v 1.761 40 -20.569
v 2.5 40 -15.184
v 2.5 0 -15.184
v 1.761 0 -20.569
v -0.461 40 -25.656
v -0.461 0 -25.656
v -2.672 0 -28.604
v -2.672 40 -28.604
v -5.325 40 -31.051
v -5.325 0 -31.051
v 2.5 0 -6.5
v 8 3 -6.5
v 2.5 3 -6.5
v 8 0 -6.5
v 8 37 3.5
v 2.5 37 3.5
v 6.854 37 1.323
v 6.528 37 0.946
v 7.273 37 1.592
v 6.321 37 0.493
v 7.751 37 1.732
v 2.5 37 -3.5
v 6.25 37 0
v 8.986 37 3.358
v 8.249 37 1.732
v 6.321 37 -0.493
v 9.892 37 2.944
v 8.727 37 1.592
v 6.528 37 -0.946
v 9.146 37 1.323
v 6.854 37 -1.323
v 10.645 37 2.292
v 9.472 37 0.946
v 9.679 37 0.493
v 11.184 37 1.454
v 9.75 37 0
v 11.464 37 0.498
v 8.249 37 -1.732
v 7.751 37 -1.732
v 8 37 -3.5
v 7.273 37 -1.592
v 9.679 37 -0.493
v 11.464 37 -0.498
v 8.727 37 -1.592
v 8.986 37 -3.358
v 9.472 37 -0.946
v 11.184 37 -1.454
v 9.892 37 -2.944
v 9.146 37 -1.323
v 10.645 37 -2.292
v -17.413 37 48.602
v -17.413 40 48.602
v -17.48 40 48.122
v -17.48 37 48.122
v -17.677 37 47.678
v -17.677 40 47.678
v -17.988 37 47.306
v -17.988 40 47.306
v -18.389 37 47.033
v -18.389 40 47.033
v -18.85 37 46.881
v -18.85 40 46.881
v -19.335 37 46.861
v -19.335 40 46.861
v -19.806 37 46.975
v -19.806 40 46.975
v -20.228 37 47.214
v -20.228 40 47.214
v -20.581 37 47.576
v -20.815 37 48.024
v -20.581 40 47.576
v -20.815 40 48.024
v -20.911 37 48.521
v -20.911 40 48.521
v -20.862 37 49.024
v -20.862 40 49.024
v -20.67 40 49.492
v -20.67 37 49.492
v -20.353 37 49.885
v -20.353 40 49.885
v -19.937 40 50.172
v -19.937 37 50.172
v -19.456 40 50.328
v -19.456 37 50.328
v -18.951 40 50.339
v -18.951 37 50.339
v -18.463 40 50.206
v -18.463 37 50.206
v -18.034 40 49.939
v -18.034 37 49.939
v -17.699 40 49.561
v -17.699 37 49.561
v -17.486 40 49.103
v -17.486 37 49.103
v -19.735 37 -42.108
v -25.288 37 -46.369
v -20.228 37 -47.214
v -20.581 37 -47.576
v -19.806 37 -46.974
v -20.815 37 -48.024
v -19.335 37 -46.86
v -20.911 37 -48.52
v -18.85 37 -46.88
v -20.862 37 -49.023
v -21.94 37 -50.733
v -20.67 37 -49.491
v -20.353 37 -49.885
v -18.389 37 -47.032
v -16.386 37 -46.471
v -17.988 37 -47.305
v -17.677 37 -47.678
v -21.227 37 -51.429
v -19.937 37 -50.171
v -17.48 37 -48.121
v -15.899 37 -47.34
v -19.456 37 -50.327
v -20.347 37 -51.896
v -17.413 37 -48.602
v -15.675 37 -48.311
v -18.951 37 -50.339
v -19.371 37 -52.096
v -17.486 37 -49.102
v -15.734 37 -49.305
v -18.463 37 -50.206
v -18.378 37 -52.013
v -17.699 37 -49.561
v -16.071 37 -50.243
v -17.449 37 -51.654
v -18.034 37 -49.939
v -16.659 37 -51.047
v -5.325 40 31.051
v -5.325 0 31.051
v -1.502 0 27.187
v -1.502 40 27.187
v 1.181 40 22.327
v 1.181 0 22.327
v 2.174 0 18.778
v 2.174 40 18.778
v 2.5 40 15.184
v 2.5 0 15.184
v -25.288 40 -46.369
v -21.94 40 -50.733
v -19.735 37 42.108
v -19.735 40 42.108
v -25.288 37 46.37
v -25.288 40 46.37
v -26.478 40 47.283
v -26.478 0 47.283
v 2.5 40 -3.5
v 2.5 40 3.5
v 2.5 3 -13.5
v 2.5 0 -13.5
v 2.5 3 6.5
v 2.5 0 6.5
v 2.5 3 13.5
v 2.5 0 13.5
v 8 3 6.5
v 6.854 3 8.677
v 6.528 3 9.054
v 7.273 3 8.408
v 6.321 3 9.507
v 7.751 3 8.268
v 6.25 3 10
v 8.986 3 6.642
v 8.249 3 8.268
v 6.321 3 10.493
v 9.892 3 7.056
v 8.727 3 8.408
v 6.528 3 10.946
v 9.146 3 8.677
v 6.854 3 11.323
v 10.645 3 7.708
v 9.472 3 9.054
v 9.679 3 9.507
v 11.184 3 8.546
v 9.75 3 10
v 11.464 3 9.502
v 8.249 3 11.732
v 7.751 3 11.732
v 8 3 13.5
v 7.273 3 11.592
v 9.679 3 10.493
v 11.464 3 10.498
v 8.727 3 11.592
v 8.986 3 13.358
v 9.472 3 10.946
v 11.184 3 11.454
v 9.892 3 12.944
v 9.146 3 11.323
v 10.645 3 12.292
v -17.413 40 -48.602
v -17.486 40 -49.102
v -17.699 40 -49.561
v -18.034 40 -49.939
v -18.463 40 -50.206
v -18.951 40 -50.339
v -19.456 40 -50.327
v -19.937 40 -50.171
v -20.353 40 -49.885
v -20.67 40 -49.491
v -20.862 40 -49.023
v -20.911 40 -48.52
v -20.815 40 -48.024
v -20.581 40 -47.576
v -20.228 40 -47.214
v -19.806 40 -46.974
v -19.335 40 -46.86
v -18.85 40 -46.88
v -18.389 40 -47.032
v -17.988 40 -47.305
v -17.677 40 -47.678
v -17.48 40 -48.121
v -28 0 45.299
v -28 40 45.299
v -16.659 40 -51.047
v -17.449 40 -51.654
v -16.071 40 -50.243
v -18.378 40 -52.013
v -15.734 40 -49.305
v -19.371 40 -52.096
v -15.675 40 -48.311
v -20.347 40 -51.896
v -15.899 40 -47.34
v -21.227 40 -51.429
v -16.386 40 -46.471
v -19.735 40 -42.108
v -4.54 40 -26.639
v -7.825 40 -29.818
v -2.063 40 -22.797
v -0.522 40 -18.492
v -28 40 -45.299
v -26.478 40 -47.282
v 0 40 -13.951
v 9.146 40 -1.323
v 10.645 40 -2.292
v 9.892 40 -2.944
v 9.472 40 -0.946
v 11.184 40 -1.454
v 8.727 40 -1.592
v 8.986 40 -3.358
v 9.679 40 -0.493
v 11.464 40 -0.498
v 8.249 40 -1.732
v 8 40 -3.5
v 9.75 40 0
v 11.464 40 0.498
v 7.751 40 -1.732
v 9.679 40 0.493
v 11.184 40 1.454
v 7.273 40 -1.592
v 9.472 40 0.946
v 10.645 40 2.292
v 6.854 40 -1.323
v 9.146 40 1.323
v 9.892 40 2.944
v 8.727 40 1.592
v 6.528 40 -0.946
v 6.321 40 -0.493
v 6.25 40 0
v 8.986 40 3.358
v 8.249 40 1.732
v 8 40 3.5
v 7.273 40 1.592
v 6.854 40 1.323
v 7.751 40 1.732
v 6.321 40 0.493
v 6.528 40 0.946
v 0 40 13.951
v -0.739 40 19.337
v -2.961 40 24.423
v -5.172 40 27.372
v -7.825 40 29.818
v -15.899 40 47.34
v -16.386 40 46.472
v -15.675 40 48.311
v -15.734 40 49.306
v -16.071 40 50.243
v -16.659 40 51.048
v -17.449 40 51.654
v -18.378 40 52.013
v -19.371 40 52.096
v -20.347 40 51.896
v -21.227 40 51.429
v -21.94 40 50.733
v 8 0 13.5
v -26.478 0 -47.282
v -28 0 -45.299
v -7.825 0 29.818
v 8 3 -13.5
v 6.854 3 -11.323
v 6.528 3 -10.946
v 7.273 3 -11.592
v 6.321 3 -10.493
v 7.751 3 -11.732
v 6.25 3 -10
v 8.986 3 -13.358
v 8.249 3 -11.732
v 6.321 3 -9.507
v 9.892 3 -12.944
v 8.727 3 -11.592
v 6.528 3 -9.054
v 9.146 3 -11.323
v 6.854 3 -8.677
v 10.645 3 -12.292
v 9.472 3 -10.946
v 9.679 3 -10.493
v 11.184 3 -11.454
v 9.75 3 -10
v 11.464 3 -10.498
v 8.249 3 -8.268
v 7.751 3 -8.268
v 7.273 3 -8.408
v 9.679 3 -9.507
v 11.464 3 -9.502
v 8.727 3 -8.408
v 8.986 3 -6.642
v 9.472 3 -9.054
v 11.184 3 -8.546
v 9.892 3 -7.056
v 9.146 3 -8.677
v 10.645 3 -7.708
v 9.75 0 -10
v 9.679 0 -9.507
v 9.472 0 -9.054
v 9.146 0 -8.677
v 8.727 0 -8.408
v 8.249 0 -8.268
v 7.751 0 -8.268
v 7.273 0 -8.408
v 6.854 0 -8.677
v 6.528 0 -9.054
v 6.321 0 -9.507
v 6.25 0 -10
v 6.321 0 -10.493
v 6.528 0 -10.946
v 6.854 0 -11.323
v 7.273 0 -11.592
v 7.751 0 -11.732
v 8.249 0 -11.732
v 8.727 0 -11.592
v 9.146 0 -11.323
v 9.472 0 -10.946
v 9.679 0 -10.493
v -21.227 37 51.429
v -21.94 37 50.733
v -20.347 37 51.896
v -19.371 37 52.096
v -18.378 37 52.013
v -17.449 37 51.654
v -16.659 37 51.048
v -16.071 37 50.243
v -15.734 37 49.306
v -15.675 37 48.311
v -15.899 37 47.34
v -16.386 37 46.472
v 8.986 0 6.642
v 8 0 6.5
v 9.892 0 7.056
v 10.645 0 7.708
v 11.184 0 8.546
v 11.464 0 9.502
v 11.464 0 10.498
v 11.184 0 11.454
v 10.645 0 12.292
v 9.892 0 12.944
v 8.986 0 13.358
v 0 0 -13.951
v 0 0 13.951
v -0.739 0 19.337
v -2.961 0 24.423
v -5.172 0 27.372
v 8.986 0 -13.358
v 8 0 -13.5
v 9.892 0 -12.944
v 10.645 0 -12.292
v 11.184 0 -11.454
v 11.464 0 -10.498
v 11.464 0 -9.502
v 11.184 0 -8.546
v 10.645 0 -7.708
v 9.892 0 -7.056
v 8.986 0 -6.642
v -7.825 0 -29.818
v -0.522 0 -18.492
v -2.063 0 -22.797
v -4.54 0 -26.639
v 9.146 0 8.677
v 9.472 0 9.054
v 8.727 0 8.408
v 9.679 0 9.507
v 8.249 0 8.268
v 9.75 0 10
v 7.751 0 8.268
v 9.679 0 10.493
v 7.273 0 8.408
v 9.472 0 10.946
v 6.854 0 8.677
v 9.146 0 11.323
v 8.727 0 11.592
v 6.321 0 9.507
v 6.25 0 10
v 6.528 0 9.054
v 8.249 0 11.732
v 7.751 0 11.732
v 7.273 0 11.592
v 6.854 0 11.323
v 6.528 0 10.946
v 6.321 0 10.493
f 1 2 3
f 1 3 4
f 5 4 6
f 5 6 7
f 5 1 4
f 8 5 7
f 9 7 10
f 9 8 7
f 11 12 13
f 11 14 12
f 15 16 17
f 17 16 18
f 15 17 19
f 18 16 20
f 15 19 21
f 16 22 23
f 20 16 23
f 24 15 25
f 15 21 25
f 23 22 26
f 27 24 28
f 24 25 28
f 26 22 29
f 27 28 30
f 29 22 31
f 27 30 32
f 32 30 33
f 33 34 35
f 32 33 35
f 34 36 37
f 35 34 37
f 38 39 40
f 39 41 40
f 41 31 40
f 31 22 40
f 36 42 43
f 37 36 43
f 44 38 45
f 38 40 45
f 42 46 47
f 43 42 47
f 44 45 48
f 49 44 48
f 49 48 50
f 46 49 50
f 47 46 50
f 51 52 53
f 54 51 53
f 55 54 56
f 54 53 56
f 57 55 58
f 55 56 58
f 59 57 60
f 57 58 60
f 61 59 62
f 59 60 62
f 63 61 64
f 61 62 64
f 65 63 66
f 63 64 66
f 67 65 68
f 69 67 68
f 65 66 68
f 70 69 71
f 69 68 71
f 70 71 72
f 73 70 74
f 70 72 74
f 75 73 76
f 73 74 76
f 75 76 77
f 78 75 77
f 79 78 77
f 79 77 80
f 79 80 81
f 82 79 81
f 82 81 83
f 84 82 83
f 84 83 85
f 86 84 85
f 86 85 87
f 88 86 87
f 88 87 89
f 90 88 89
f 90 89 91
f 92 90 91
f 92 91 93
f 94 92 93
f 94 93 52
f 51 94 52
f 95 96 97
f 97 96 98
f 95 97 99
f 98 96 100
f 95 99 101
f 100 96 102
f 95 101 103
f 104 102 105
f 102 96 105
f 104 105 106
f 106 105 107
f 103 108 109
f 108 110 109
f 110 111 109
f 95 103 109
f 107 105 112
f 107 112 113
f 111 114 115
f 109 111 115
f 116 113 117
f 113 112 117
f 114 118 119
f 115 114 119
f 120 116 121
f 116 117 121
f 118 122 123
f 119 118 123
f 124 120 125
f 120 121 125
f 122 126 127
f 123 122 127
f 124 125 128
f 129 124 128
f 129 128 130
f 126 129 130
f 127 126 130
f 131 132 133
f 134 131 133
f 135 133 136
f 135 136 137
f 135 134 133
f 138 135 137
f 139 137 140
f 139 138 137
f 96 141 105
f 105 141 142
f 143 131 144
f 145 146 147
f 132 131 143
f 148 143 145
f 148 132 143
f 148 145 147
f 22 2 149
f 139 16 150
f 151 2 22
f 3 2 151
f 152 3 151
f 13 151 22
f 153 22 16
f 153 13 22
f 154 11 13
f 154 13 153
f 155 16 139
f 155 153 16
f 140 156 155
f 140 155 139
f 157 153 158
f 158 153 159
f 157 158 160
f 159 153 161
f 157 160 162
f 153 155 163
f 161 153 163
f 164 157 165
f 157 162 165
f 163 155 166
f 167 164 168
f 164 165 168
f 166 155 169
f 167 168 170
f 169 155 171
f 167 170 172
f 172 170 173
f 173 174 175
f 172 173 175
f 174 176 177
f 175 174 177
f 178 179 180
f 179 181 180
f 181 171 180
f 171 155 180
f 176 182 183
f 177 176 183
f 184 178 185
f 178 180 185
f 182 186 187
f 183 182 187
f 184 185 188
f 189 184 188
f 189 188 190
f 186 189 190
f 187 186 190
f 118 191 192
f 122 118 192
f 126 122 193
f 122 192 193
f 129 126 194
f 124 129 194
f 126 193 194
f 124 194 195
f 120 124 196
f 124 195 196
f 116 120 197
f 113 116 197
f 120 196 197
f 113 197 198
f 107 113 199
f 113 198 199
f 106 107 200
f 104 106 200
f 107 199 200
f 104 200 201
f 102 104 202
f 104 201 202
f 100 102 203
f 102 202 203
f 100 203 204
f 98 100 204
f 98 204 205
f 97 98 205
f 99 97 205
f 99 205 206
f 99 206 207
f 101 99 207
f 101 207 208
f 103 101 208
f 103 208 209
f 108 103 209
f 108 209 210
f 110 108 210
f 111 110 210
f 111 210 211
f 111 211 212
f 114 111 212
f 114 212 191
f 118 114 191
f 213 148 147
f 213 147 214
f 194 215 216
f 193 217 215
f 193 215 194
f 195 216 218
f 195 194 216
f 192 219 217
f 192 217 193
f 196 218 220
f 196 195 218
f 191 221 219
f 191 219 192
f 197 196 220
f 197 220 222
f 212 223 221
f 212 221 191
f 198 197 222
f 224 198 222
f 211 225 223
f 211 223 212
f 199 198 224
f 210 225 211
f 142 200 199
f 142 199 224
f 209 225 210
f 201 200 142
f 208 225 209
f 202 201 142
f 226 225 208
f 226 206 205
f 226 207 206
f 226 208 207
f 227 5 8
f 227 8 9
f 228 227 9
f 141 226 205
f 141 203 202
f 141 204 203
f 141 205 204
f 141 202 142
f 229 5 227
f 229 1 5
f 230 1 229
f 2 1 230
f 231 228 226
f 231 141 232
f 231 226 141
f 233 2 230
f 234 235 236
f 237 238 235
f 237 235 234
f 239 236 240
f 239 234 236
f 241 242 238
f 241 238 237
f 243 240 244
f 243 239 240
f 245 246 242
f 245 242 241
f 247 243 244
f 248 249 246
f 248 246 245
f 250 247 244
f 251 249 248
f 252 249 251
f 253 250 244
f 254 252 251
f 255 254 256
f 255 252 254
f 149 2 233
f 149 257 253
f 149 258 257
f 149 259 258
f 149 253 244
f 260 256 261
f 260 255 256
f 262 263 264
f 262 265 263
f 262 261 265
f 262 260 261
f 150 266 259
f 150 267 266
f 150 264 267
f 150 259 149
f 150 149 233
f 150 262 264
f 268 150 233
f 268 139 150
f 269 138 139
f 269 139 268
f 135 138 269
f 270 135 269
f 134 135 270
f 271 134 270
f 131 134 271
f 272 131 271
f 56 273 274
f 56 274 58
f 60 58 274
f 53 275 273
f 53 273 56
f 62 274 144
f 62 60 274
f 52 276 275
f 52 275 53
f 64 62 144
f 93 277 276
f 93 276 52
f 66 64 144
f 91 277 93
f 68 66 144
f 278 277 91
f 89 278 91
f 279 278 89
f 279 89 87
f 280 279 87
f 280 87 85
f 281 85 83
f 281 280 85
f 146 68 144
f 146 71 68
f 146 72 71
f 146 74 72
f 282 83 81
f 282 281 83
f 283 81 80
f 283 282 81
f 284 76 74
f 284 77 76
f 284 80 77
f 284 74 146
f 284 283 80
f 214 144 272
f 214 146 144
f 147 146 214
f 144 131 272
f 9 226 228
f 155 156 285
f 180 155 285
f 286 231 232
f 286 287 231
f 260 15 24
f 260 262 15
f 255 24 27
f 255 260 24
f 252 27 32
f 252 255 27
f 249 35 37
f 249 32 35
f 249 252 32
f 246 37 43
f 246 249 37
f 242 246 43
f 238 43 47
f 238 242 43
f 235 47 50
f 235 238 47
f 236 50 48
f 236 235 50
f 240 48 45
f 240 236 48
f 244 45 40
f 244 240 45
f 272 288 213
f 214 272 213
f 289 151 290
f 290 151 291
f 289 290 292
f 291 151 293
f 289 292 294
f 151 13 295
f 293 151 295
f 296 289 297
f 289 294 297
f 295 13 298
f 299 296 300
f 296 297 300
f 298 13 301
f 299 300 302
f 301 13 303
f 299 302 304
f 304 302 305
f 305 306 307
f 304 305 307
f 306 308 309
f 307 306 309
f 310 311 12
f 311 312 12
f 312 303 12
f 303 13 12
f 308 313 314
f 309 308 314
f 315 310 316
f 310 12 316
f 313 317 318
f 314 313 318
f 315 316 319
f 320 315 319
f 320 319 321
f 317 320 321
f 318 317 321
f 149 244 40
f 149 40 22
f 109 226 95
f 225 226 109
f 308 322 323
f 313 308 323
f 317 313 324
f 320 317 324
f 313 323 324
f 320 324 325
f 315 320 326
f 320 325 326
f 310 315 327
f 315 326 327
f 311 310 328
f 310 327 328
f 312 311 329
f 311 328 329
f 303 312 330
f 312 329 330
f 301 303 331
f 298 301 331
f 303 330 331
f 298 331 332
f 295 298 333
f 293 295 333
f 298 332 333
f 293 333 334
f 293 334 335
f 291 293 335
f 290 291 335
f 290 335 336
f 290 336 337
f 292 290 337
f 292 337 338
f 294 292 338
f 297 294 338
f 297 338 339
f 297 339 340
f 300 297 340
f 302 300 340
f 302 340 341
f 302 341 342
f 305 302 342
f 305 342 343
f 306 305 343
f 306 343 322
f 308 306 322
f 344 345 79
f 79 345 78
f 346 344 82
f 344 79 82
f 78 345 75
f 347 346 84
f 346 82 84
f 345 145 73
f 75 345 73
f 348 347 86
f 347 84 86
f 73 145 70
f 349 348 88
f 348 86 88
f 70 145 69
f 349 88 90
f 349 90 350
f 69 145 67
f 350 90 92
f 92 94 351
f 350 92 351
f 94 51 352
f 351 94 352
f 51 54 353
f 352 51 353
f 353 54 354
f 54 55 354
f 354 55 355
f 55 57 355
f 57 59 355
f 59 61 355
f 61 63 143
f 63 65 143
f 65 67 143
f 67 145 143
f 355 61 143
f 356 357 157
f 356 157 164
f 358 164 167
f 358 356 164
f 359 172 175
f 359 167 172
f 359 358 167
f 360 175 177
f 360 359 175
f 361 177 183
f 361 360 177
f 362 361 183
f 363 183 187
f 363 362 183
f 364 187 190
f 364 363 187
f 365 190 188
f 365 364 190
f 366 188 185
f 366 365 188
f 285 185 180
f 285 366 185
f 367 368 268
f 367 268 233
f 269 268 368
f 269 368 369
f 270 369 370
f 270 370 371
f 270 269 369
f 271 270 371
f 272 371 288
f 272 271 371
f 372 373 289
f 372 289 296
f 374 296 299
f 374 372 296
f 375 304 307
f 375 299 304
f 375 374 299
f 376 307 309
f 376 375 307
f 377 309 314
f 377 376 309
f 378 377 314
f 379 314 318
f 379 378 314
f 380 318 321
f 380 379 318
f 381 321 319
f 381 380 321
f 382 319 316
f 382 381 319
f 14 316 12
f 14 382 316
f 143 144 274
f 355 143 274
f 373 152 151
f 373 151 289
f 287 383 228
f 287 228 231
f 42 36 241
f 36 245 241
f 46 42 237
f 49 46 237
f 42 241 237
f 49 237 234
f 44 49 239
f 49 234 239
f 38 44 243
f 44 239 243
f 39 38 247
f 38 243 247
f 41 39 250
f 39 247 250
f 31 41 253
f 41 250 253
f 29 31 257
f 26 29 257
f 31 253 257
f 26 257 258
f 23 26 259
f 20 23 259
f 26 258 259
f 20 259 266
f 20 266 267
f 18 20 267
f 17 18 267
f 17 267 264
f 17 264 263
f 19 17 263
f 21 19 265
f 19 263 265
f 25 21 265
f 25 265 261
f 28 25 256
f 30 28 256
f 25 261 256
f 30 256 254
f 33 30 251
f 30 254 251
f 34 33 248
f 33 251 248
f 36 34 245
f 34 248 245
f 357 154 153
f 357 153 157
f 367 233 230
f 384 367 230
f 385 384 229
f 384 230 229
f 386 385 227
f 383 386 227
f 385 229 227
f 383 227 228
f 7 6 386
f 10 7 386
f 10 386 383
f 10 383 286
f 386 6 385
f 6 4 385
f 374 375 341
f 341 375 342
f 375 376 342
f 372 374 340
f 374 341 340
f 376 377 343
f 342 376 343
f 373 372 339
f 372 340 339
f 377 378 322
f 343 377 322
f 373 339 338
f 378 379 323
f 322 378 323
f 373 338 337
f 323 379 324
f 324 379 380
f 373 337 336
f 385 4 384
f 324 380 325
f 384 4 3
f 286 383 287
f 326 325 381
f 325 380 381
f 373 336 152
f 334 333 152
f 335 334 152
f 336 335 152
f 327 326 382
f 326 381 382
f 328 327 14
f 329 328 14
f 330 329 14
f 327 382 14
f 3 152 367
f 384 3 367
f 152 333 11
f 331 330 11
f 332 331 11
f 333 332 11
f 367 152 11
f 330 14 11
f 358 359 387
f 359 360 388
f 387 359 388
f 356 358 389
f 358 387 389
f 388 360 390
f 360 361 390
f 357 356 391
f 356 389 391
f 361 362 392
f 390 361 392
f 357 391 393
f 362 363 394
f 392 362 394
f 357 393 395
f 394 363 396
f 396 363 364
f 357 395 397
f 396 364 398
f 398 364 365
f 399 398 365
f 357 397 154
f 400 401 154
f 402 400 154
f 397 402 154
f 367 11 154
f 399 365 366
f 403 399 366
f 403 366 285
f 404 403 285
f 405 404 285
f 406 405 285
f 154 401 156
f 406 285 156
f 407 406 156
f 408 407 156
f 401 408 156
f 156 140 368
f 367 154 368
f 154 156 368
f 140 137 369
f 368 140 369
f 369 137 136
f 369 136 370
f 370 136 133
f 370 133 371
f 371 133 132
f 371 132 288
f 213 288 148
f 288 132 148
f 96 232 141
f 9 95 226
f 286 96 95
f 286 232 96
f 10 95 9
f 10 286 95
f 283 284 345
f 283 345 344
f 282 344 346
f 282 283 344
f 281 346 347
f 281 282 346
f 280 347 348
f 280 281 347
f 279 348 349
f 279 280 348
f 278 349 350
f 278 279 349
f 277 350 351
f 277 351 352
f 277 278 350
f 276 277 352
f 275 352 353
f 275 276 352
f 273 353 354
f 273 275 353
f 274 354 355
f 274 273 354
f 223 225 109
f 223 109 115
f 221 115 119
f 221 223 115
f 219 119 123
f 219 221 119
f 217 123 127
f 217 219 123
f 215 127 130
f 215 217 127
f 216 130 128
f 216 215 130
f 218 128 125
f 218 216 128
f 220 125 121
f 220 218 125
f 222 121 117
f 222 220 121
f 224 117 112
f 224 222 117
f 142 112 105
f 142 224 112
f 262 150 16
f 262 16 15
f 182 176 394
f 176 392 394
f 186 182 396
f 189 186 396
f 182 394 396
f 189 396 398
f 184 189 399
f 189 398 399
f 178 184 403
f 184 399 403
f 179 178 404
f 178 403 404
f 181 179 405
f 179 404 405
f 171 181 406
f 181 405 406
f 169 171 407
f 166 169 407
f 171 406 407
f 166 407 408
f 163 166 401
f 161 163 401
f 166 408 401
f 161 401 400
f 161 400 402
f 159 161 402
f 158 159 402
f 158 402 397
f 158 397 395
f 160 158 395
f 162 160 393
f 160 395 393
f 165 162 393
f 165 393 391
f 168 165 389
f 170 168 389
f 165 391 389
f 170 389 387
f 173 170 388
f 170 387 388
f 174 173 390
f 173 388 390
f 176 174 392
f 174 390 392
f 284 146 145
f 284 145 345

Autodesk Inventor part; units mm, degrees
ref_plane "YZ Plane" through (0, 0, 0) normal (1, 0, 0) x (0, 1, 0)
ref_plane "XZ Plane" through (0, 0, 0) normal (0, 1, 0) x (-1, 0, 0)
ref_plane "XY Plane" through (0, 0, 0) normal (0, 0, 1) x (1, 0, 0)
sketch "Sketch1" plane through (0, 0, 0) normal (0, 1, 0) x (-1, 0, 0)
  line L0 (0, 0) -> (0, 23.8143)
  line L1 (0, 23.8143) -> (7.4151, 29.5041)
  line L2 (0, 23.8143) -> (9.3465, 23.8143) construction
  line L3 (0, 23.8143) -> (28, 45.2994)
  line L4 (0, 23.8143) -> (0, -23.8137)
  line L5 (0, -23.8137) -> (28, -45.2989)
  line L6 (28, -45.2989) -> (26.4781, -47.2823)
  line L7 (26.4781, -47.2823) -> (-0.4066, -26.6529)
  line L8 (0, -16.592) -> (-2.5, -16.592)
  line L9 (-2.5, -16.592) -> (-2.5, -25.0466)
  line L10 (-2.5, -25.0466) -> (-0.4066, -26.6529)
  line L11 (-2.5, -16.592) -> (-2.5, 22.9887)
  line L12 (0.8654, 24.4783) -> (-0.6565, 26.4617)
  line L13 (-0.6565, 26.4617) -> (-2.5, 25.0471)
  line L14 (-2.5, 25.0471) -> (-2.5, 22.9887)
  line L15 (-0.6565, 26.4617) -> (26.4781, 47.2828)
  line L16 (26.4781, 47.2828) -> (28, 45.2994)
  line L17 (26.4781, 47.2828) -> (28, 45.2994)
  line L18 (28, 45.2994) -> (0.8654, 24.4783)
  dimension "d0" = 23.8143
  dimension "d1" = 37.5
  dimension "d2" = 35.2932
  dimension "d3" = 47.628
  dimension "d4" = 35.2932
  dimension "d5" = 2.5
  dimension "d6" = 2.5
  dimension "d7" = 2.5
extrude "Extrusion1" add sketch "Sketch1" along normal blind 40
sketch "Sketch2" plane through (0, 40, 0) normal (0, 1, 0) x (1, 0, 0)
  line L0 (0, 0) -> (8, 0)
  line L1 (-28, 45.2989) -> (0, 23.8137) projected
  line L2 (-28, 45.2989) -> (-24.0332, 42.2551)
  line L3 (-24.0332, 42.2551) -> (-19.1631, 48.6019)
  line L4 (0, -23.8143) -> (-28, -45.2994) projected
  line L5 (-28, -45.2994) -> (-24.0332, -42.2556)
  line L6 (-24.0332, -42.2556) -> (-19.1631, -48.6024)
  circle A0 centre (-19.1631, -48.6024) radius 1.75
  circle A1 centre (-19.1631, -48.6024) radius 3.5
  circle A2 centre (8, 0) radius 1.75
  circle A3 centre (8, 0) radius 3.5
  circle A4 centre (-19.1631, 48.6019) radius 1.75
  circle A5 centre (-19.1631, 48.6019) radius 3.5
  line L7 (2.5, 25.0466) -> (-26.4781, 47.2823) projected
  line L8 (-22.5113, 44.2385) -> (-25.2881, 46.3691)
  line L9 (-25.2881, 46.3691) -> (-21.9399, 50.7326)
  line L10 (-22.5113, 44.2385) -> (-19.7346, 42.1078)
  line L11 (-19.7346, 42.1078) -> (-16.3864, 46.4712)
  line L12 (8, 3.5) -> (2.5, 3.5)
  line L13 (2.5, 3.5) -> (2.5, -3.5)
  line L14 (2.5, -25.0471) -> (2.5, 25.0466) projected
  line L15 (2.5, -3.5) -> (8, -3.5)
  line L16 (-26.4781, -47.2828) -> (2.5, -25.0471) projected
  line L17 (-22.5113, -44.239) -> (-19.7346, -42.1083)
  line L18 (-19.7346, -42.1083) -> (-16.3864, -46.4718)
  line L19 (-22.5113, -44.239) -> (-25.2881, -46.3697)
  line L20 (-25.2881, -46.3697) -> (-21.9399, -50.7331)
  dimension "d10" = 8
  dimension "d11" = 5
  dimension "d12" = 8
  dimension "d13" = 8
  dimension "d14" = 3.5
  dimension "d15" = 7
  dimension "d16" = 3.5
  dimension "d17" = 7
  dimension "d18" = 3.5
  dimension "d19" = 7
  dimension "d20" = 3.5
  dimension "d21" = 3.5
extrude "Extrusion2" add sketch "Sketch2" against normal blind 3
sketch "Sketch3" plane through (0, 0, 0) normal (0, -1, 0) x (1, 0, 0)
  line L0 (0, 0) -> (0, 10)
  line L1 (0, -23.8137) -> (0, 23.8143) projected
  line L2 (0, 10) -> (0, -10)
  line L3 (0, -10) -> (8, -10)
  line L4 (0, 10) -> (8, 10)
  circle A0 centre (8, 10) radius 1.75
  circle A1 centre (8, -10) radius 1.75
  circle A2 centre (8, -10) radius 3.5
  circle A3 centre (8, 10) radius 3.5
  line L5 (2.5, 25.0471) -> (2.5, -25.0466) projected
  line L6 (2.5, 10) -> (2.5, 6.5)
  line L7 (2.5, 6.5) -> (8, 6.5)
  line L8 (2.5, 10) -> (2.5, 13.5)
  line L9 (2.5, 13.5) -> (8, 13.5)
  line L10 (2.5, -10) -> (2.5, -13.5)
  line L11 (2.5, -13.5) -> (8, -13.5)
  line L12 (2.5, -10) -> (2.5, -6.5)
  line L13 (2.5, -6.5) -> (8, -6.5)
  dimension "d24" = 10
  dimension "d25" = 20
  dimension "d26" = 8
  dimension "d27" = 3.5
  dimension "d28" = 7
extrude "Extrusion3" add sketch "Sketch3" against normal blind 3 contours L5 L9 A3 L4 | L4 A3 L7 L5 | L5 L13 A2 L3 | L3 A2 L11 L5 | A3 | A2
sketch "Sketch4" plane through (0, 0, 0) normal (0, -1, 0) x (1, 0, 0)
  line L0 (2.5, 13.5) -> (8, 13.5) projected
  line L1 (2.5, 13.5) -> (12.0473, 13.5)
  line L2 (12.0473, 13.5) -> (12.0473, 6.5)
  line L3 (12.0473, 6.5) -> (2.5, 6.5)
  line L4 (2.5, 6.5) -> (2.5, 13.5)
  line L5 (2.5, -6.5) -> (8, -6.5) projected
  line L6 (2.5, -6.5) -> (13.899, -6.5)
  line L7 (13.899, -6.5) -> (13.899, -13.5)
  line L8 (13.899, -13.5) -> (2.5, -13.5)
  line L9 (2.5, -13.5) -> (2.5, -6.5)
  point P0 (0, 0)
  dimension "d31" = 7
extrude "Extrusion4" cut sketch "Sketch4" against normal blind 3
sketch "Sketch5" plane through (0, 0, 0) normal (0, -1, 0) x (1, 0, 0)
  point P0 (0, 0)
fillet "Fillet1" radius 20 4 edges at (0, 20, -23.8137) (0, 20, 23.8143) (2.5, 20, 25.0471) (2.5, 20, -25.0466)
sketch "Sketch6" plane through (0, 0, 0) normal (0, -1, 0) x (1, 0, 0)
  line L0 (0, 0) -> (0, 10)
  line L1 (0, -13.9508) -> (0, 13.9514) projected
  line L2 (0, 10) -> (8, 10)
  circle A0 centre (8, 10) radius 1.75
  circle A1 centre (8, 10) radius 3.5
  line L3 (2.5, 15.1842) -> (2.5, 3.5) projected
  line L4 (2.5, 10) -> (2.5, 13.5)
  line L5 (2.5, 13.5) -> (8, 13.5)
  line L6 (2.5, 10) -> (2.5, 6.5)
  line L7 (2.5, 6.5) -> (8, 6.5)
  line L8 (0, 0) -> (0, -10)
  line L9 (0, -10) -> (8, -10)
  circle A2 centre (8, -10) radius 1.75
  circle A3 centre (8, -10) radius 3.5
  line L10 (8, -6.5) -> (2.5, -6.5)
  line L11 (2.5, 15.1842) -> (2.5, -15.1837) projected
  line L12 (2.5, -6.5) -> (2.5, -13.5)
  line L13 (2.5, -13.5) -> (8, -13.5)
  dimension "d35" = 10
  dimension "d36" = 8
  dimension "d37" = 3.5
  dimension "d38" = 7
  dimension "d39" = 10
  dimension "d40" = 8
extrude "Extrusion5" add sketch "Sketch6" against normal blind 3 contours L3 L5 A1 L2 | L2 A1 L7 L3 | L11 L10 A3 L9 | L9 A3 L13 L11 | A1 | A3
properties part number "Capcture Zone4"
